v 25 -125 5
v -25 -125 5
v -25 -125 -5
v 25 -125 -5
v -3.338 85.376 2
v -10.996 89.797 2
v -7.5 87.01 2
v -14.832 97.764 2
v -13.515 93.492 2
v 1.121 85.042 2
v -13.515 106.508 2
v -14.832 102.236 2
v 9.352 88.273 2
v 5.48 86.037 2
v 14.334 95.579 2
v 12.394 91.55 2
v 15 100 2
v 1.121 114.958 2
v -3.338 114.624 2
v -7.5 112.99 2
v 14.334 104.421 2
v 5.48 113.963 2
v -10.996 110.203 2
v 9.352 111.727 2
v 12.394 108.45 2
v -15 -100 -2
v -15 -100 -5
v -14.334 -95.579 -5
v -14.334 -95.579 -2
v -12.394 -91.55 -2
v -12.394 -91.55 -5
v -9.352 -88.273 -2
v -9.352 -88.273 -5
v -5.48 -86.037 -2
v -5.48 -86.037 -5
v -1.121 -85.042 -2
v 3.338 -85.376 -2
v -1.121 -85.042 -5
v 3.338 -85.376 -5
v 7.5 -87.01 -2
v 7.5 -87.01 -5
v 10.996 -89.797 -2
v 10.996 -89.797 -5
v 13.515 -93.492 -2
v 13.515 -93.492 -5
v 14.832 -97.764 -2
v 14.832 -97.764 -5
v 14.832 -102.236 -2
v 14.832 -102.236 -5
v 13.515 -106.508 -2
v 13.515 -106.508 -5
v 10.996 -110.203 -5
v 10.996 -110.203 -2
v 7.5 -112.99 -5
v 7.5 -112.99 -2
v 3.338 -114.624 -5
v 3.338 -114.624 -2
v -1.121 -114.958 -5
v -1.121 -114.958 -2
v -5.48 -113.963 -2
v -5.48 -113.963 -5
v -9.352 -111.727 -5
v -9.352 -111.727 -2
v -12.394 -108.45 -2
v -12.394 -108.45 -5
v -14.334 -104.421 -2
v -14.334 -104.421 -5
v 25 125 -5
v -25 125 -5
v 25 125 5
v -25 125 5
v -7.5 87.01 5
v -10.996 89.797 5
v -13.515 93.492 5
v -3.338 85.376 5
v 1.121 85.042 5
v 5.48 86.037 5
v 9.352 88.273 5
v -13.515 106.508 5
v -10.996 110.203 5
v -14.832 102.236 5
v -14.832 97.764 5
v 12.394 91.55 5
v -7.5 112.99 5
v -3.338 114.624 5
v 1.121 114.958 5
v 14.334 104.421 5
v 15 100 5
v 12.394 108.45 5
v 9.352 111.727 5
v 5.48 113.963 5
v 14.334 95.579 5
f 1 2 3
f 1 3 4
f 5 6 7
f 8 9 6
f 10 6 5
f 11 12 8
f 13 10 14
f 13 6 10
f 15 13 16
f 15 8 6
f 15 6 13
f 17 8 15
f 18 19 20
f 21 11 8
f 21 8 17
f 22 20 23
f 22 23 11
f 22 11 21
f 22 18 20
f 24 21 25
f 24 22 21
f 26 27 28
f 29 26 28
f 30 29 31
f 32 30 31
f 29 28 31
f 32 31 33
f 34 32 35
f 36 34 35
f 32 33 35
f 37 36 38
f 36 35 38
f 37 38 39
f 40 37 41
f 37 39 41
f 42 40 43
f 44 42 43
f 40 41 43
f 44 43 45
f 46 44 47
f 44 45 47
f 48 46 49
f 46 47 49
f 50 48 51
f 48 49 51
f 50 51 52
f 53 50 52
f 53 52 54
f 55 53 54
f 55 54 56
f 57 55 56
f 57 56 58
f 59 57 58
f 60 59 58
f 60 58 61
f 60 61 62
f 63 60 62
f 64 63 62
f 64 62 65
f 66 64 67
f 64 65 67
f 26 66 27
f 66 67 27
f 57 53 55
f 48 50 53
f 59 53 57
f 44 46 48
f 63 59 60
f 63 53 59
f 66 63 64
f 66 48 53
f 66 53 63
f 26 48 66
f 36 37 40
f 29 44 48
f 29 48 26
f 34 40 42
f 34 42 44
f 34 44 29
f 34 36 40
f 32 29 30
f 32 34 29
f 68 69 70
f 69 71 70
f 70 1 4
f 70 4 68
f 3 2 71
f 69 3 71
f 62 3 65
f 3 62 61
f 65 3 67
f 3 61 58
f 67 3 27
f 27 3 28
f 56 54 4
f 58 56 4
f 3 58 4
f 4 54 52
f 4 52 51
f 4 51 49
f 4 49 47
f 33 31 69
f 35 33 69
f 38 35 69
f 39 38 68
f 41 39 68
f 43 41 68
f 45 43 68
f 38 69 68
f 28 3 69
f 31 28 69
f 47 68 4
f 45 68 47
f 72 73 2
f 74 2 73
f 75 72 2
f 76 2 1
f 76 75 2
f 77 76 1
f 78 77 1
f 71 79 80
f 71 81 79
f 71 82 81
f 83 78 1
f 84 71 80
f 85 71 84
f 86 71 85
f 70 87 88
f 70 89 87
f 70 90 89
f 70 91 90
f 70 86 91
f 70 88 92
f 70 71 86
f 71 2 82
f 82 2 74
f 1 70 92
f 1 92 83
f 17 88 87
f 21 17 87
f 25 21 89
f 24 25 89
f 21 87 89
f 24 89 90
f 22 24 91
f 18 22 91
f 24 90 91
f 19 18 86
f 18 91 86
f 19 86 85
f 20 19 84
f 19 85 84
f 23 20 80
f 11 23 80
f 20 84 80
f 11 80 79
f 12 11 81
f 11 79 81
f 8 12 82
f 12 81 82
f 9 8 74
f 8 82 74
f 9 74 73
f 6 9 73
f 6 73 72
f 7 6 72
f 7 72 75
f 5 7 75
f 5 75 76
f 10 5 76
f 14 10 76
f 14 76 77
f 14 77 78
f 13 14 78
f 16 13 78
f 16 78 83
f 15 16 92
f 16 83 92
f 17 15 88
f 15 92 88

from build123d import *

# Parameters (mm, degrees)
SKETCH1_W           = 50
SKETCH1_H           = 250
BOSS_EXTRUDE1_DEPTH = 5
SKETCH2_R           = 15
CUT_EXTRUDE1_DEPTH  = 3
SKETCH5_R           = 15
CUT_EXTRUDE2_DEPTH  = 3


with BuildPart() as part:
    # Sketch1 → Boss-Extrude1 (new, symmetric)
    with BuildSketch(Plane.XY):
        Rectangle(SKETCH1_W, SKETCH1_H)
    extrude(amount=BOSS_EXTRUDE1_DEPTH, both=True)

    # Sketch2 → Cut-Extrude1 (cut)
    with BuildSketch(Plane.XY.offset(5)):
        with Locations((0, 100)):
            Circle(SKETCH2_R)
    extrude(amount=-CUT_EXTRUDE1_DEPTH, mode=Mode.SUBTRACT)

    # Sketch5 → Cut-Extrude2 (cut)
    with BuildSketch(Plane(origin=(0, 0, -5), x_dir=(-1, 0, 0), z_dir=(0, 0, -1))):
        with Locations((0, -100)):
            Circle(SKETCH5_R)
    extrude(amount=-CUT_EXTRUDE2_DEPTH, mode=Mode.SUBTRACT)


solid = part.part
